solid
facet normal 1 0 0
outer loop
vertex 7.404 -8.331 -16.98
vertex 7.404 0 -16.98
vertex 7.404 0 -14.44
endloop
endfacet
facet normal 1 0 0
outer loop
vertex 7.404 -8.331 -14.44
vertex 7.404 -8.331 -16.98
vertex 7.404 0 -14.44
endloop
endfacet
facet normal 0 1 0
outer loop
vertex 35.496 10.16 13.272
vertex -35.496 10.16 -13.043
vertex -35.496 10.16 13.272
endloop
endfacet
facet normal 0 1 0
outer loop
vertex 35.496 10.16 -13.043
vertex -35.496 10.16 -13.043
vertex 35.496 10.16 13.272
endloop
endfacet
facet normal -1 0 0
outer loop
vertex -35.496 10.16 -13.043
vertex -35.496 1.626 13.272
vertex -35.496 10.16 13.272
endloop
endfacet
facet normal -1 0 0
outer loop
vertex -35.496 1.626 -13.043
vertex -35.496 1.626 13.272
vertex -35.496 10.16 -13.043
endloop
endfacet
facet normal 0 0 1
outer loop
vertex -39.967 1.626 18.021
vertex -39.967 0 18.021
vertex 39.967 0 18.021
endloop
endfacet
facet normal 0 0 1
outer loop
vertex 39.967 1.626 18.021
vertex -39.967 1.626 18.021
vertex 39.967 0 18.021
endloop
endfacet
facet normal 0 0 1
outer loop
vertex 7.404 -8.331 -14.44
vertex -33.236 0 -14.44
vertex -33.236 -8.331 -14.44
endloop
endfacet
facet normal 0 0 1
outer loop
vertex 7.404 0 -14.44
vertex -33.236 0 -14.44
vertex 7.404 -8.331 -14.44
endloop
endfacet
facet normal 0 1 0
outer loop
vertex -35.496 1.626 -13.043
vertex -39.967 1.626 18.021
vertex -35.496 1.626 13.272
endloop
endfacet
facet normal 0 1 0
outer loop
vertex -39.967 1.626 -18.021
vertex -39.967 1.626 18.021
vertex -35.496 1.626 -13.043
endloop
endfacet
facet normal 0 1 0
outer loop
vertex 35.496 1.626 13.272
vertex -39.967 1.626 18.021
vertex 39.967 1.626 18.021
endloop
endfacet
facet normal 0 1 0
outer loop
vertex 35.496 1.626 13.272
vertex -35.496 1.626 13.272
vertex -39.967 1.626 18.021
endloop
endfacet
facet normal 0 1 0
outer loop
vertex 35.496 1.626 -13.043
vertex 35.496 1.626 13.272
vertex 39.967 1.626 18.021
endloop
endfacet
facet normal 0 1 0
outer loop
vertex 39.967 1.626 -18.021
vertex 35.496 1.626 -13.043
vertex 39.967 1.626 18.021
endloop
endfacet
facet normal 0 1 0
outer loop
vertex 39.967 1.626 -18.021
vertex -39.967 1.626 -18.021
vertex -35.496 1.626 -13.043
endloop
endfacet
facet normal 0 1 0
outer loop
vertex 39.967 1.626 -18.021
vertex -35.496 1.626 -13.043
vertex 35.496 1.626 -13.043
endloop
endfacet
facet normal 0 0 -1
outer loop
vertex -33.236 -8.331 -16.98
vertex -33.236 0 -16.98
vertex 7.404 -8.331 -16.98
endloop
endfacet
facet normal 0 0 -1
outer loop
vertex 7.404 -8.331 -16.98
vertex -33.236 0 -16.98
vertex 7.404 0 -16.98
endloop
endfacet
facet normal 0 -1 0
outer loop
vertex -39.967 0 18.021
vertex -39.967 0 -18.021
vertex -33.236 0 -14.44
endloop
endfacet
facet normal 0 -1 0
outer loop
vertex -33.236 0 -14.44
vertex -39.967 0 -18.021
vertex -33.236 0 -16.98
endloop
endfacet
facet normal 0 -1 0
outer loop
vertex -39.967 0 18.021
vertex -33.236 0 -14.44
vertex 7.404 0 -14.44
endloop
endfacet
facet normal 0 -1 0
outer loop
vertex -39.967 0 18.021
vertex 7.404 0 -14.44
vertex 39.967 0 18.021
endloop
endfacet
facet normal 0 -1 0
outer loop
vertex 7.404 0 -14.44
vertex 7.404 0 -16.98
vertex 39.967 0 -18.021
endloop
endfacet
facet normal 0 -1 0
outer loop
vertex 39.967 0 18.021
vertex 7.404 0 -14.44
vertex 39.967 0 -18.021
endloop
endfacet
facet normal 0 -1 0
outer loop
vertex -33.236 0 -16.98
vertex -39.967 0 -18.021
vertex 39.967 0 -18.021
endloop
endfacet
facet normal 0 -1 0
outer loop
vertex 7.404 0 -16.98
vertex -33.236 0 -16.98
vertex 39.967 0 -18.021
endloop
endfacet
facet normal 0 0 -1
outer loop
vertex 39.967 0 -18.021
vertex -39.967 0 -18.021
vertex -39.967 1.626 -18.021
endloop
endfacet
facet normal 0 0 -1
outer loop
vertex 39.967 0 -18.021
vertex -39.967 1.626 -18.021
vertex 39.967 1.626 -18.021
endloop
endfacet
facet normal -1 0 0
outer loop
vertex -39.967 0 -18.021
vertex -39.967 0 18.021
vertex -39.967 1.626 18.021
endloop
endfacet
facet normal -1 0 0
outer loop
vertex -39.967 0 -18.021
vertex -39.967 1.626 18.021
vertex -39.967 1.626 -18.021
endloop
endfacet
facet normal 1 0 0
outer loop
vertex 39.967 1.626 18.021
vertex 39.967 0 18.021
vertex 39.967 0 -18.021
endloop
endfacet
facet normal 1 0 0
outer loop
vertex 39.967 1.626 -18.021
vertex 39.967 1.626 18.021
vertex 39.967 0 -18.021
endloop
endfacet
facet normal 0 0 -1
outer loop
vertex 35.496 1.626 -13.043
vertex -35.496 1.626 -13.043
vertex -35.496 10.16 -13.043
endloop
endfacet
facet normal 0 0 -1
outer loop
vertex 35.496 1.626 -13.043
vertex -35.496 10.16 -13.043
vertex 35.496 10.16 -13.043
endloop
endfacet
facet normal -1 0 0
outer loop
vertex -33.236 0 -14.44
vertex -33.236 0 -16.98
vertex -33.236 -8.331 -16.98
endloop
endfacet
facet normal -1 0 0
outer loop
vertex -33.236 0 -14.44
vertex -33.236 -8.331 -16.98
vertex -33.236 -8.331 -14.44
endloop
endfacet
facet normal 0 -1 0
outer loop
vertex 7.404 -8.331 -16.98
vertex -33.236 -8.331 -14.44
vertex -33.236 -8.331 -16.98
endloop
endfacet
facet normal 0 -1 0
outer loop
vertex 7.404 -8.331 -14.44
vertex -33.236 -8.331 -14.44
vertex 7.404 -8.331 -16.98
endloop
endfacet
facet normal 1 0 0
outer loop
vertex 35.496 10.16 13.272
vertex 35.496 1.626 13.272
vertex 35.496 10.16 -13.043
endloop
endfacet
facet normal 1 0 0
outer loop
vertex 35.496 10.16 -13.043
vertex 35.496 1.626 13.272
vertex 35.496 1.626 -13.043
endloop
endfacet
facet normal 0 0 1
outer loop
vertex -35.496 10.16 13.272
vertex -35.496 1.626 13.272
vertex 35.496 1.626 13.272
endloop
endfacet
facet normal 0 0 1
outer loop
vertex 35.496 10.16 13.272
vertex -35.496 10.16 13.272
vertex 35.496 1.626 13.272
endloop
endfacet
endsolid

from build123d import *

# Parameters (mm, degrees)
SKETCH1_W           = 79.9338
SKETCH1_H           = 36.0426
BOSS_EXTRUDE1_DEPTH = 1.6256
SKETCH2_W           = 70.993
SKETCH2_H           = 26.3144
BOSS_EXTRUDE2_DEPTH = 8.5344
SKETCH3_W           = 40.64
SKETCH3_H           = 2.54
BOSS_EXTRUDE3_DEPTH = 8.3312


with BuildPart() as part:
    # Sketch1 → Boss-Extrude1 (new body)
    with BuildSketch(Plane(origin=(0, 0, 0), x_dir=(1, 0, 0), z_dir=(0, 1, 0))):
        Rectangle(SKETCH1_W, SKETCH1_H)
    extrude(amount=BOSS_EXTRUDE1_DEPTH)

    # Sketch2 → Boss-Extrude2 (add)
    with BuildSketch(Plane(origin=(0, 1.6256, 0), x_dir=(1, 0, 0), z_dir=(0, 1, 0))):
        with Locations((0, -0.1143)):
            Rectangle(SKETCH2_W, SKETCH2_H)
    extrude(amount=BOSS_EXTRUDE2_DEPTH)

    # Sketch3 → Boss-Extrude3 (add)
    with BuildSketch(Plane.XZ):
        with Locations((-12.9159, -15.7099)):
            Rectangle(SKETCH3_W, SKETCH3_H)
    extrude(amount=BOSS_EXTRUDE3_DEPTH)


solid = part.part
